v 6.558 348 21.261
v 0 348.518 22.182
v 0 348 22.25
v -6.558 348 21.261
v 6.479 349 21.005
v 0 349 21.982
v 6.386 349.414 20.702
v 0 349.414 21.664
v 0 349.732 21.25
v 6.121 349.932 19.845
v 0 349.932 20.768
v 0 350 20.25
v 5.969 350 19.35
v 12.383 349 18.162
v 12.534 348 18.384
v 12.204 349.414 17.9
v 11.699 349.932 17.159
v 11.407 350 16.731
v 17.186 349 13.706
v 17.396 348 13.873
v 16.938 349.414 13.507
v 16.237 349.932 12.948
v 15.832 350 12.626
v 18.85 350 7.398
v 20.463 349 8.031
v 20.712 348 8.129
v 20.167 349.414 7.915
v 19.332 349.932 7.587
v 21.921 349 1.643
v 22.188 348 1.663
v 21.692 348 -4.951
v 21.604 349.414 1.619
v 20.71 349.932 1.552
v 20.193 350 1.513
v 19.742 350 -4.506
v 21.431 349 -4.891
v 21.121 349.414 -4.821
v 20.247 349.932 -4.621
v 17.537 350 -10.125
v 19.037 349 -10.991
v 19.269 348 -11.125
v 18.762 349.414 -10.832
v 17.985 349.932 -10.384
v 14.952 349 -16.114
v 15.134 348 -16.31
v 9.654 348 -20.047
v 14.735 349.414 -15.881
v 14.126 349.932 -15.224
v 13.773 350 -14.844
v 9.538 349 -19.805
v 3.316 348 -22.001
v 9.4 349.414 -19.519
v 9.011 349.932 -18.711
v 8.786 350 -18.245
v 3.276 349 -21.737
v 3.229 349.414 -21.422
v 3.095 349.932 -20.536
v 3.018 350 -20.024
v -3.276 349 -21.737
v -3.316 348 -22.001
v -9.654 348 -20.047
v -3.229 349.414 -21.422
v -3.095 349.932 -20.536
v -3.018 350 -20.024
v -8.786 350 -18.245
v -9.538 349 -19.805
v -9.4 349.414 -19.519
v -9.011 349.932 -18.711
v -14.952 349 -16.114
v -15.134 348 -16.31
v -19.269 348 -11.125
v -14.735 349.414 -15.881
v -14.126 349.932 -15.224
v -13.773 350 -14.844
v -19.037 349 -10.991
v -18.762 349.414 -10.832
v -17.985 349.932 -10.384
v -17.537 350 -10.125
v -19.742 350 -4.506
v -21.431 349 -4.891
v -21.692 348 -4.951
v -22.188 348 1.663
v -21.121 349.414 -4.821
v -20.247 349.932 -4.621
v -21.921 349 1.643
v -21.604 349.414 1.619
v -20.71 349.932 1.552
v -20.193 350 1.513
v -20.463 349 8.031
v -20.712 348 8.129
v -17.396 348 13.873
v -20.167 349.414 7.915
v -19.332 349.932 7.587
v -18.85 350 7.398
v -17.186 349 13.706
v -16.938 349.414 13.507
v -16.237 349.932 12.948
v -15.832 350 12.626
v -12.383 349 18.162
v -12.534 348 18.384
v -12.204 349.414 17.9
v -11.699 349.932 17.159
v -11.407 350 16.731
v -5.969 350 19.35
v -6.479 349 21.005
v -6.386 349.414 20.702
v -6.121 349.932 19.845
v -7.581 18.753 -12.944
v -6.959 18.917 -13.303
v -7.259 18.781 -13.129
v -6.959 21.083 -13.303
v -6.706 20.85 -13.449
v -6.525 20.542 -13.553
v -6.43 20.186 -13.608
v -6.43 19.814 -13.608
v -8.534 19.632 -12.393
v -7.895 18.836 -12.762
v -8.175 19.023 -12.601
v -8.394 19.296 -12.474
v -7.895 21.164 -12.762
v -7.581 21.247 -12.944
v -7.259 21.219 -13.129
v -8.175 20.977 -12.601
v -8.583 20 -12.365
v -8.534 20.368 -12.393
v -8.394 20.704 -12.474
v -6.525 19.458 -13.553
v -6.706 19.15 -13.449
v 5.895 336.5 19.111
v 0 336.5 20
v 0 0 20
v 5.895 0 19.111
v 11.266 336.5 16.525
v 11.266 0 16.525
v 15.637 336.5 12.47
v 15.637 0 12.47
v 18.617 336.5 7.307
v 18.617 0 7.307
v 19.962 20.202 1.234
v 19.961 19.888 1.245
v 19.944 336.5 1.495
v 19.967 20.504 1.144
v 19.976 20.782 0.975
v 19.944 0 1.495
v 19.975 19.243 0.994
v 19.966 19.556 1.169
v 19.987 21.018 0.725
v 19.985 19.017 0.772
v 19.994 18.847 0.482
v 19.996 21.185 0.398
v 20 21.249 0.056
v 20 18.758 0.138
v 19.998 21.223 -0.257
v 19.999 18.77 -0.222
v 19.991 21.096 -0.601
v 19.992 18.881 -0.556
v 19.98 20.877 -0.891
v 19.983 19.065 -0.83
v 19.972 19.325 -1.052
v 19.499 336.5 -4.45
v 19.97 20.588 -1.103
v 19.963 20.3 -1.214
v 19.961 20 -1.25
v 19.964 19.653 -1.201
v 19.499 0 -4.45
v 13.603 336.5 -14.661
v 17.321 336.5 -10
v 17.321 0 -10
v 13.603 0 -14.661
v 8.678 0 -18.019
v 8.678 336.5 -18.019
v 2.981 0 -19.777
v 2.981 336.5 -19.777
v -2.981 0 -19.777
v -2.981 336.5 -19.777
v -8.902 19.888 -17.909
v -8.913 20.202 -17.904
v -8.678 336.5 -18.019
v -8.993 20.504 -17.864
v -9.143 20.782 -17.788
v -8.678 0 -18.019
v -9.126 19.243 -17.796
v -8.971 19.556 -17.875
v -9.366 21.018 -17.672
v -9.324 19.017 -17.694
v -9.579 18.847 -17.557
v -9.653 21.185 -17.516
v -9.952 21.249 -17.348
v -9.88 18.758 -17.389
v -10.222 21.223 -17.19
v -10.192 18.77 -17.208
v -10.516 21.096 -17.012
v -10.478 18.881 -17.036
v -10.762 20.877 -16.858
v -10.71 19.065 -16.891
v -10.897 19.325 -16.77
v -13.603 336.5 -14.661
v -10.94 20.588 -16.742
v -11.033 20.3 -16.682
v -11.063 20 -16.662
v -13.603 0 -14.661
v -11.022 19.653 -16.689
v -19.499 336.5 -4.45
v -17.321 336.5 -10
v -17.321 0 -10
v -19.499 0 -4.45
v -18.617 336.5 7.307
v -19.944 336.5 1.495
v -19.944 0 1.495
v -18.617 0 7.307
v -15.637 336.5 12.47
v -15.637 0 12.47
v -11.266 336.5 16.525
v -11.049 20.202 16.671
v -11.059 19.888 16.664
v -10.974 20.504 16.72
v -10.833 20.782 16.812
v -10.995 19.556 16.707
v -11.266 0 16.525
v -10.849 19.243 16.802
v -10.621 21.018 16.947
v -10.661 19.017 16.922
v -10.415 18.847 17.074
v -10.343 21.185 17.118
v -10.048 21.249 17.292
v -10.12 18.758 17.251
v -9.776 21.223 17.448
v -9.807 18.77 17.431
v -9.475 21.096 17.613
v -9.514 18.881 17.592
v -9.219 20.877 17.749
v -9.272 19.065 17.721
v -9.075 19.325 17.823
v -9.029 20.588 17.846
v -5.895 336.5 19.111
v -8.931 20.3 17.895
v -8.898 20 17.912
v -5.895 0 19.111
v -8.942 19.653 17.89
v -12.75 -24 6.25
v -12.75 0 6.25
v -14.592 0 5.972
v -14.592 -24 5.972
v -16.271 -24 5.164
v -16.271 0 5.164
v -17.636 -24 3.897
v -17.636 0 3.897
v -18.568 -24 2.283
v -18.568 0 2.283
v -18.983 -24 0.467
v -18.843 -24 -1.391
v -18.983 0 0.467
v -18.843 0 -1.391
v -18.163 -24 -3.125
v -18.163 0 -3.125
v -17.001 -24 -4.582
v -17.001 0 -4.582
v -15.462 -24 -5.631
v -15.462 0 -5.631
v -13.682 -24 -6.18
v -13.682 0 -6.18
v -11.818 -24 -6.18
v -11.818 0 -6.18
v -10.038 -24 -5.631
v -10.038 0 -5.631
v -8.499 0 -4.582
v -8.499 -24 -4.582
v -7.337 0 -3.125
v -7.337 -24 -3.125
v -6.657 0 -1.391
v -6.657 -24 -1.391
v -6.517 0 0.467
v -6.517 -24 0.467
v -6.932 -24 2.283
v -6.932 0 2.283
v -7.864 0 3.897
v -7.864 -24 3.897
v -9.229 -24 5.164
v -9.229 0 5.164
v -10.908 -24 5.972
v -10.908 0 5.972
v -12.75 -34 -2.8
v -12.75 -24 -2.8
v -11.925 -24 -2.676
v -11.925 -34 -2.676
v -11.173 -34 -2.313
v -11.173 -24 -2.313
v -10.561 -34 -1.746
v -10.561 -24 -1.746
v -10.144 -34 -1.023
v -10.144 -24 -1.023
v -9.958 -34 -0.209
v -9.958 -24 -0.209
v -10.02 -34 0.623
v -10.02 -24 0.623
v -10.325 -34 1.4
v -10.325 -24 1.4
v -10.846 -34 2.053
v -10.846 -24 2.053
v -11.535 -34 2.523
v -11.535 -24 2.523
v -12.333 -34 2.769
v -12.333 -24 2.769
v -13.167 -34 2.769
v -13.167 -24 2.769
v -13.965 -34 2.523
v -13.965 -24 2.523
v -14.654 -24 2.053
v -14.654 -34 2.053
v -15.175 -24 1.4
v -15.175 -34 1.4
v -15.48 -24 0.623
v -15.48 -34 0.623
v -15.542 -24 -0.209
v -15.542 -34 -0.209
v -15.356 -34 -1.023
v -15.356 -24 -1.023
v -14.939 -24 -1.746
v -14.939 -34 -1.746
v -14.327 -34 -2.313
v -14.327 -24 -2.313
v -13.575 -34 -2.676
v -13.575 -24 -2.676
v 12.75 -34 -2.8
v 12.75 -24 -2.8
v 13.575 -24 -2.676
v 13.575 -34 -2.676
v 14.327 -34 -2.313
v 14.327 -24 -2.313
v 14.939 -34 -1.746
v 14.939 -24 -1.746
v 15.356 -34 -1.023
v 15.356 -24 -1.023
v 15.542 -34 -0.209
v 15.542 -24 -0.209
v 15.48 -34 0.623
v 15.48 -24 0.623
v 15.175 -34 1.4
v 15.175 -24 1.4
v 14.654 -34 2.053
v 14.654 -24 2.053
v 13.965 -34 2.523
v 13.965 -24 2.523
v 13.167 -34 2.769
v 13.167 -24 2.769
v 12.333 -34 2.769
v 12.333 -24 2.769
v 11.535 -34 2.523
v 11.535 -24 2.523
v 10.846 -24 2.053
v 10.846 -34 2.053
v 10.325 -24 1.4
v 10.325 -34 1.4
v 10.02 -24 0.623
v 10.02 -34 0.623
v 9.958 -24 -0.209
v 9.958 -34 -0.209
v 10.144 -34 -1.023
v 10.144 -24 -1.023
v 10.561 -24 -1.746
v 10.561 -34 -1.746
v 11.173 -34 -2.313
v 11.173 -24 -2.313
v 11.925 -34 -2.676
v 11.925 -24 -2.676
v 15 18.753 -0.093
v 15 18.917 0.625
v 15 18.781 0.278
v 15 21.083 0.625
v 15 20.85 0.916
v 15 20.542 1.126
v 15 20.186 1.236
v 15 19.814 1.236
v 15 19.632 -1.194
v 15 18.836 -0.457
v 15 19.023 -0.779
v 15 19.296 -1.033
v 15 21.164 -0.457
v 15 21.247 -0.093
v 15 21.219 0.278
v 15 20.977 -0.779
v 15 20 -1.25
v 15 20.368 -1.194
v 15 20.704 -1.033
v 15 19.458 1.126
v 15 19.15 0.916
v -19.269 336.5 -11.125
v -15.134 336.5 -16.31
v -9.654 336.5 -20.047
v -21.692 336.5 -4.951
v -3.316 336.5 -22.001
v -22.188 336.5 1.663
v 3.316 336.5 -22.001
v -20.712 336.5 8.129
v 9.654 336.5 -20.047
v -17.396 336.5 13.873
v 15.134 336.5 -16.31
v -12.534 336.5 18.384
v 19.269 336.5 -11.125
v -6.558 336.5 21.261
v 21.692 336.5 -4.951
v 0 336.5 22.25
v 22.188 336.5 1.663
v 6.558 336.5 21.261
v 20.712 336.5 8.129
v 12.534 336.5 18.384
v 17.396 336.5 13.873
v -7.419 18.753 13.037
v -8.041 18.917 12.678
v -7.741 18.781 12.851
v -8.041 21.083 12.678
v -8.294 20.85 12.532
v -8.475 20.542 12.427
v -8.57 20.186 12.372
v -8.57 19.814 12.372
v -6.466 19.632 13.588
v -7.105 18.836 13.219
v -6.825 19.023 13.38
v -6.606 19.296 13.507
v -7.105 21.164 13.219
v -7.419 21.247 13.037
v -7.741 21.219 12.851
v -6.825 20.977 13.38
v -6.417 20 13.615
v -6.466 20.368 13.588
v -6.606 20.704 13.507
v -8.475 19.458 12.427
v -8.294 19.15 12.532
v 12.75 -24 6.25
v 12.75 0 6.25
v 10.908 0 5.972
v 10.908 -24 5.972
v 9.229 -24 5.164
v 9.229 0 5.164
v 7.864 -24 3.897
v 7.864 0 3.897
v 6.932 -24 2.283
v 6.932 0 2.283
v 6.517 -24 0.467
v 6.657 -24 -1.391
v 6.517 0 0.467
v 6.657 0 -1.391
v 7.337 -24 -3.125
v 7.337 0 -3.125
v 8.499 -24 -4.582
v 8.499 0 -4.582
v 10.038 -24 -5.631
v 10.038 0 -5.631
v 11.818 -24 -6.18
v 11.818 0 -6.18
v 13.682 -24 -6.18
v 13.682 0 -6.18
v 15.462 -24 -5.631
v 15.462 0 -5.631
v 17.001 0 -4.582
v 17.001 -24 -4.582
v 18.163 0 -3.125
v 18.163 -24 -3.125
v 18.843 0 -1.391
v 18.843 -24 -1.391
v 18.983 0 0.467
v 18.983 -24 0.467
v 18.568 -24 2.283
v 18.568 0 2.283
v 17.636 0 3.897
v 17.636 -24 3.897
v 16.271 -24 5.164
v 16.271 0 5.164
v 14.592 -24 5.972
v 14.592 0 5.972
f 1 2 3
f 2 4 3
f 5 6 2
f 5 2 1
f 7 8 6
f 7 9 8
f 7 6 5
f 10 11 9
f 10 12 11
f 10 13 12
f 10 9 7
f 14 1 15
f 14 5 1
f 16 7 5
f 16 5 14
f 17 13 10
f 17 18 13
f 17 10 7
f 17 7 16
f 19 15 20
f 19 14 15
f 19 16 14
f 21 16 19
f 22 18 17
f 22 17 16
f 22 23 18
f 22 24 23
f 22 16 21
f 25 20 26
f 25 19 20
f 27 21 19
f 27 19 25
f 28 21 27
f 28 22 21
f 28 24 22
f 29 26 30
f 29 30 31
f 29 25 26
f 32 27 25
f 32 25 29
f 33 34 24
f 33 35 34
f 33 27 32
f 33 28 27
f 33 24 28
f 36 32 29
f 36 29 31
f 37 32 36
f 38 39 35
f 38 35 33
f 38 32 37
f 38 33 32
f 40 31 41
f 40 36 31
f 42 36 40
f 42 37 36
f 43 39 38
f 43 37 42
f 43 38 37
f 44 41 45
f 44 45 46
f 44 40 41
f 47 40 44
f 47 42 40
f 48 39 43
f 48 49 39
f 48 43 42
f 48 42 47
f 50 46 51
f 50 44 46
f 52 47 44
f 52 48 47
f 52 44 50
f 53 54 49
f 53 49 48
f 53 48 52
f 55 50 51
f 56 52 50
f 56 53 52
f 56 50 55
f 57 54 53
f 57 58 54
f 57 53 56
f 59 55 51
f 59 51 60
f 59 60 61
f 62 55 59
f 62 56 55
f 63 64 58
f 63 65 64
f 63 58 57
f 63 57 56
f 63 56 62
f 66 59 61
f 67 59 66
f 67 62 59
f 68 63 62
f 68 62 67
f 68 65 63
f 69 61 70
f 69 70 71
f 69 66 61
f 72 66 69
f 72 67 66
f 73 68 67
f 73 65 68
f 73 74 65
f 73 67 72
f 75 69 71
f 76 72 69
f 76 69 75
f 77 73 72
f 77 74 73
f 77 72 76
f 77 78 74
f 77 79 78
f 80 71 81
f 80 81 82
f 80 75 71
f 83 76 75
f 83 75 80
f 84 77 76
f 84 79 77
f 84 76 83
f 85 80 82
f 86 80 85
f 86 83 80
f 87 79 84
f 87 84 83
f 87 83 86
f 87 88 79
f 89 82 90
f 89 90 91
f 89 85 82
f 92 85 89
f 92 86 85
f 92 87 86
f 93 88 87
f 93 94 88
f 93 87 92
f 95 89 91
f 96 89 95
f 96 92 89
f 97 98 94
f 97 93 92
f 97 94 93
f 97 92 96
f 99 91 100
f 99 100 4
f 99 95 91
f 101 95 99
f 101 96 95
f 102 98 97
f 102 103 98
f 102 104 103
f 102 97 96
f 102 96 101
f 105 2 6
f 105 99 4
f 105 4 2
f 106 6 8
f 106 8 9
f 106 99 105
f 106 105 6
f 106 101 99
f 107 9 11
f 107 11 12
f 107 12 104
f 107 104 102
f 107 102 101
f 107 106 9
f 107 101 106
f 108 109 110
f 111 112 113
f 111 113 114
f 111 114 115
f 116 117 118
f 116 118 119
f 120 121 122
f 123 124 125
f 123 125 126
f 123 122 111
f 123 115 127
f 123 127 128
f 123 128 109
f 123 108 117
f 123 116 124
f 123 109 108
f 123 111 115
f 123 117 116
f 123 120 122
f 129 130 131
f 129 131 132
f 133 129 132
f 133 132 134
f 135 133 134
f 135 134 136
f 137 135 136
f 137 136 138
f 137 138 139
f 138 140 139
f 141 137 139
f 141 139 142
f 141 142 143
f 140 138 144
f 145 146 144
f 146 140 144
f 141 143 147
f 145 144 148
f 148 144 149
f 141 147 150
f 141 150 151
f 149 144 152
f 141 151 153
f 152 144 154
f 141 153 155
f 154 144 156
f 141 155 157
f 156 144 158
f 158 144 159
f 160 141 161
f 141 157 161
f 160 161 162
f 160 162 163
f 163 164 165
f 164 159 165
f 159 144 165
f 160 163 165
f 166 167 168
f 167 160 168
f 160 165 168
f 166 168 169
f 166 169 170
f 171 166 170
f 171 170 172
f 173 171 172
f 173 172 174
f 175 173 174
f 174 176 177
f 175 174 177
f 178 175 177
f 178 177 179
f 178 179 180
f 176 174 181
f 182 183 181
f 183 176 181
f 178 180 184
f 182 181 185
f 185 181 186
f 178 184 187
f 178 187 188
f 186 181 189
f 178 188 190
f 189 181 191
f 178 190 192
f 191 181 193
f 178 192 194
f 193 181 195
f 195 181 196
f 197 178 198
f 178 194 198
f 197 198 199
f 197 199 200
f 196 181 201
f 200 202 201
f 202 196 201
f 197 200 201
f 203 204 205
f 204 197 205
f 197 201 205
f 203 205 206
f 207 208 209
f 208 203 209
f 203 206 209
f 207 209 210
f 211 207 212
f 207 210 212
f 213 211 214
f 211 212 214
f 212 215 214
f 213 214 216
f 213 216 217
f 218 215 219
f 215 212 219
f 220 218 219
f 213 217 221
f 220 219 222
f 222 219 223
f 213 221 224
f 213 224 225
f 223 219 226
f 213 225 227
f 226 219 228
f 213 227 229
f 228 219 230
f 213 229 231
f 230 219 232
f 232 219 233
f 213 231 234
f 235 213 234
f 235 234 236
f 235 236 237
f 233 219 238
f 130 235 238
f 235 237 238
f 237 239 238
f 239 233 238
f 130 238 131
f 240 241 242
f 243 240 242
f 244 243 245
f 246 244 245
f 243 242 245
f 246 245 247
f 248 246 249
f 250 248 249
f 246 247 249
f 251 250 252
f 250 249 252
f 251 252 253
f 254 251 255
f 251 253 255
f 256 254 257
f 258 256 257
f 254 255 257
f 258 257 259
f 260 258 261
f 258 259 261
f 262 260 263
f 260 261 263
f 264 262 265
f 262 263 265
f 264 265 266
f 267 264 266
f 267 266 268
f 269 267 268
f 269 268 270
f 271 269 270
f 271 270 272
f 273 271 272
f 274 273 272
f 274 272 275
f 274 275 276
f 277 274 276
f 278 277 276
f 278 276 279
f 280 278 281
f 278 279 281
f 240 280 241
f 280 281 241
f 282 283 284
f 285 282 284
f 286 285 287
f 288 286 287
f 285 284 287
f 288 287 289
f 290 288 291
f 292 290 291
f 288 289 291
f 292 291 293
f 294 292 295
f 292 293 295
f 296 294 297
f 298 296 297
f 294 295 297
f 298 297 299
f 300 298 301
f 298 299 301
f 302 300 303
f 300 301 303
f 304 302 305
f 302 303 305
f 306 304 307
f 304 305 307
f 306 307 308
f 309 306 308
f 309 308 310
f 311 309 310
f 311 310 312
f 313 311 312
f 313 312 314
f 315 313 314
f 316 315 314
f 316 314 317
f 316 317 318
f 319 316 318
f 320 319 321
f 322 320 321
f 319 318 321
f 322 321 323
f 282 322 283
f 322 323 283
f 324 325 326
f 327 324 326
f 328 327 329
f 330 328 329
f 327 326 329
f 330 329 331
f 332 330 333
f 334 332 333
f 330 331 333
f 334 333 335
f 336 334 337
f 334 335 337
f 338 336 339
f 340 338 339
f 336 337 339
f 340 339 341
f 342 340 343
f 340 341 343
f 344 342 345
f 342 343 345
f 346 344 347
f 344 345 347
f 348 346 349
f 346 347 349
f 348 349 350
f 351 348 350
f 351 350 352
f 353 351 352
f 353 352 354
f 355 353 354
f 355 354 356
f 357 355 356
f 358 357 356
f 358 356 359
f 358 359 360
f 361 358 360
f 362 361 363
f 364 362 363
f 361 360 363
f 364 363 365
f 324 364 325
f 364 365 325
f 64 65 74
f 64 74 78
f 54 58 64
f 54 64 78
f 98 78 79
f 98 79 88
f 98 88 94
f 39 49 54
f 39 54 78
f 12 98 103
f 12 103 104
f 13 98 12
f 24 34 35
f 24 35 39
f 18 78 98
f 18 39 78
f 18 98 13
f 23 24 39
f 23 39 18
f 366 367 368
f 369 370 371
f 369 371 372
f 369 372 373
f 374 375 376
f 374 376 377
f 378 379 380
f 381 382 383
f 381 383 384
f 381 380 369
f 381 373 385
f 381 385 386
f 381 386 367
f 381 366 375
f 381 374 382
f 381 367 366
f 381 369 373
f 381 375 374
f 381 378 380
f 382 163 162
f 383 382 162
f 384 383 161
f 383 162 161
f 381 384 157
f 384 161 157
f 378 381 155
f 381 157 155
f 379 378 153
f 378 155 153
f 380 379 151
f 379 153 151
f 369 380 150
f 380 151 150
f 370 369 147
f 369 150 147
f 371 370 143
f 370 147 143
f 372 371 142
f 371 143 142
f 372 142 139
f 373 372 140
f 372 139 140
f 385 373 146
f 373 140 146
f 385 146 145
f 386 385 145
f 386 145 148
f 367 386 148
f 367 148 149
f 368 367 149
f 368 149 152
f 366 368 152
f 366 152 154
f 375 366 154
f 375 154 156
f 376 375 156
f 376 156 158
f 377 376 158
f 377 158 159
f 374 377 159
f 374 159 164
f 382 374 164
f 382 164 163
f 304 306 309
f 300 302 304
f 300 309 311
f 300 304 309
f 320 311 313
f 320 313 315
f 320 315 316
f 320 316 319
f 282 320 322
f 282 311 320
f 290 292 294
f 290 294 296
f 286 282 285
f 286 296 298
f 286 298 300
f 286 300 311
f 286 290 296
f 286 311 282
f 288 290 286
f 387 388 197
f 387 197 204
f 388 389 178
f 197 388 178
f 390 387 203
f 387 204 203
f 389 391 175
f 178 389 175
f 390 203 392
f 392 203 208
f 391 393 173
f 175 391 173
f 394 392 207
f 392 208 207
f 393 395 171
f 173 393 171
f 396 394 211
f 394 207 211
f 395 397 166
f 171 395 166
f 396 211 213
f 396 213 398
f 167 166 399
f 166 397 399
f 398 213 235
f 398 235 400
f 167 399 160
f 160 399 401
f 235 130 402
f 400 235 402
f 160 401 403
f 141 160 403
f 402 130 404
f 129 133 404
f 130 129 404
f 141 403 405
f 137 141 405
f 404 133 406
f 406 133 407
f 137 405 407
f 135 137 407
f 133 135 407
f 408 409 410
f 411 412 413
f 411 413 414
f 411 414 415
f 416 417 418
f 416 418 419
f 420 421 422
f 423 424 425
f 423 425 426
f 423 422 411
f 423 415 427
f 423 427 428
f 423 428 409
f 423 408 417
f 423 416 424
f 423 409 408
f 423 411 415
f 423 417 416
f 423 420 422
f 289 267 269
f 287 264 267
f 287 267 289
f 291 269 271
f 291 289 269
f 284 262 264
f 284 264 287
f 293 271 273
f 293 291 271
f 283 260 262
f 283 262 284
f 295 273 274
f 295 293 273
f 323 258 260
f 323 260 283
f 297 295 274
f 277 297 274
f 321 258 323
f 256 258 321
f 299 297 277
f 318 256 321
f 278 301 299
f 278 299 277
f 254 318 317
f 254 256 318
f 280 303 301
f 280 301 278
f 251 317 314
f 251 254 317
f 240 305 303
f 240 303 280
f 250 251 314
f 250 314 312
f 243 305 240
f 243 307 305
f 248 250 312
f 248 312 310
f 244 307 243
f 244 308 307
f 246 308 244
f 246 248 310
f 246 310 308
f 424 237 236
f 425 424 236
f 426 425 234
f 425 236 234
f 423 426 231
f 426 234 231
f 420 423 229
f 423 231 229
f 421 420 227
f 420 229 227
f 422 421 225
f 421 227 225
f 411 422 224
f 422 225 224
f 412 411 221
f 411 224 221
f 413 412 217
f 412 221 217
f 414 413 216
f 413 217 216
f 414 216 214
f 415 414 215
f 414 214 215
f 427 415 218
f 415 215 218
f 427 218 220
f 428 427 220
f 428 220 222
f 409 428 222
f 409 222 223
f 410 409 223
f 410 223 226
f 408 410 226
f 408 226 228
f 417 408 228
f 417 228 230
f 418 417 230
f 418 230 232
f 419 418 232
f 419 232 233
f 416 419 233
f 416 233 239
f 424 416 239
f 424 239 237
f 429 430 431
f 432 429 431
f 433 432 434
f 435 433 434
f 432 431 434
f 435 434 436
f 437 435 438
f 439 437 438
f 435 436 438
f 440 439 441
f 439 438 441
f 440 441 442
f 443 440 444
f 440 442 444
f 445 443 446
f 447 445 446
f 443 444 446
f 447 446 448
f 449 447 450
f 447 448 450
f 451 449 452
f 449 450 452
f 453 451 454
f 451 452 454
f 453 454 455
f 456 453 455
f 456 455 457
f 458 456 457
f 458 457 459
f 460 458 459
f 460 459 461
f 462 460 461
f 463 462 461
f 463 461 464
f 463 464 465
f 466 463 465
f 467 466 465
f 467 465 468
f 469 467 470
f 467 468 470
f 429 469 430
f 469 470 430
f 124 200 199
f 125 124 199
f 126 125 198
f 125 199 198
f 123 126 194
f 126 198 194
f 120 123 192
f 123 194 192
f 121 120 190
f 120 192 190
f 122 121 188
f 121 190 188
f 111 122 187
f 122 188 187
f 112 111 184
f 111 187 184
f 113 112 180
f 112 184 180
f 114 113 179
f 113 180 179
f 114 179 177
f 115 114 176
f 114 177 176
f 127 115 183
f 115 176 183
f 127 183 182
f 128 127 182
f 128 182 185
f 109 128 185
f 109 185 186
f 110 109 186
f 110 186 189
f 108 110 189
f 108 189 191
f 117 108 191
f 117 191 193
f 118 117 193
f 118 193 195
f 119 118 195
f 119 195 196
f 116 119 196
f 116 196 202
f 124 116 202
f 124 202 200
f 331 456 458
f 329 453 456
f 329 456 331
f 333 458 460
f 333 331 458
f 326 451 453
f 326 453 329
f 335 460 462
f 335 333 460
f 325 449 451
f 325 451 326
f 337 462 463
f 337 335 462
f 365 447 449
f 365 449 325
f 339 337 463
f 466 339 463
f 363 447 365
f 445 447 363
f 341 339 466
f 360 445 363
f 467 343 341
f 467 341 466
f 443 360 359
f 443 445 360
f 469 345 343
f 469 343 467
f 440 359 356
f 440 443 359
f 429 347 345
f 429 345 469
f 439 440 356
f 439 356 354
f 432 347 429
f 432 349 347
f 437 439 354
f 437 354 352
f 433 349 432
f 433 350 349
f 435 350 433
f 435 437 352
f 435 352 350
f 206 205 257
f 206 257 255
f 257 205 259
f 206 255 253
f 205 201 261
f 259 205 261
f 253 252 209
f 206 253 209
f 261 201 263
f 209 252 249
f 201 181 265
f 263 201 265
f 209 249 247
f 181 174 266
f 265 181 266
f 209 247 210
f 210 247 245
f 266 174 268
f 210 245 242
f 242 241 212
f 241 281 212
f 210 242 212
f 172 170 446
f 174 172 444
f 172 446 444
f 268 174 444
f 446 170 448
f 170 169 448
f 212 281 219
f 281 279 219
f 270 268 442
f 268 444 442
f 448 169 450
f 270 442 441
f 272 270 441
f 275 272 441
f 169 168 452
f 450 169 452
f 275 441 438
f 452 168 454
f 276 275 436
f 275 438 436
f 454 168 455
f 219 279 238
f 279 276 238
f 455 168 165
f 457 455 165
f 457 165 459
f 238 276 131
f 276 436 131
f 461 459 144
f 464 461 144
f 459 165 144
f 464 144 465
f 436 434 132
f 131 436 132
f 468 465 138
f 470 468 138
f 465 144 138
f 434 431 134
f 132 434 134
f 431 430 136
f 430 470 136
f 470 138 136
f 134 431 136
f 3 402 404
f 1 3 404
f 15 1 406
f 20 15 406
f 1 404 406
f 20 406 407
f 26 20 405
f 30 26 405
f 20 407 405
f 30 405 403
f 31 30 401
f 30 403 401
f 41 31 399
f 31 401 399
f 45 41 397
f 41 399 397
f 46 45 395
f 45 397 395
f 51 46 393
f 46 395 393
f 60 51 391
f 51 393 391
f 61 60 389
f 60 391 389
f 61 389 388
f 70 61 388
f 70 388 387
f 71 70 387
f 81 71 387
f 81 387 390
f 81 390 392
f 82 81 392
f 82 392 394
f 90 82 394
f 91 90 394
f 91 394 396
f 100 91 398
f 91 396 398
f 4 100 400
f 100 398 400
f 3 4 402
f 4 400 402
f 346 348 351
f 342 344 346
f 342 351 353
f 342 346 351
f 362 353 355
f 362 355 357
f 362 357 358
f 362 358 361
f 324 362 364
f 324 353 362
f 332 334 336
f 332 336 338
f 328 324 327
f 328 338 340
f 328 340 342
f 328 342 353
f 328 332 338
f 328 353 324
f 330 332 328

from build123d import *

# Parameters (mm, degrees)
SKETCH1_R                = 20
BOSS_EXTRUDE1_DEPTH      = 345
BOSS_EXTRUDE2_DEPTH      = 5
BOSS_EXTRUDE2_DEPTH_BACK = 8.5
SKETCH2_R                = 22.25
FILLET1_R                = 2
SKETCH3_R                = 1.25
CUT_EXTRUDE1_DEPTH       = 5
CIRPATTERN1_COUNT        = 3
SKETCH4_R                = 6.25
BOSS_EXTRUDE3_DEPTH      = 24
SKETCH5_R                = 2.8
BOSS_EXTRUDE4_DEPTH      = 10


with BuildPart() as part:
    # Sketch1 → Boss-Extrude1 (new body)
    with BuildSketch(Plane(origin=(0, 0, 0), x_dir=(1, 0, 0), z_dir=(0, 1, 0))):
        with Locations(Location((0, 0, 0), (0, 0, 270))):
            Circle(SKETCH1_R)
    extrude(amount=BOSS_EXTRUDE1_DEPTH)

    # Sketch2 → Boss-Extrude2 (add, two sides: drawn at the far end of the back side and taken through both)
    with BuildSketch(Plane(origin=(0, 345, 0), x_dir=(1, 0, 0), z_dir=(0, 1, 0)).offset(-BOSS_EXTRUDE2_DEPTH_BACK)):
        with Locations(Location((0, 0, 0), (0, 0, 270))):
            Circle(SKETCH2_R)
    extrude(amount=BOSS_EXTRUDE2_DEPTH + BOSS_EXTRUDE2_DEPTH_BACK)

    # Fillet1
    fillet1_edges = [part.edges().sort_by_distance(p)[0] for p in [
        (0, 350, -22.25),
    ]]
    fillet(fillet1_edges, radius=FILLET1_R)

    # Sketch3 → Cut-Extrude1 (cut)
    with BuildSketch(Plane(origin=(20, 0, 0), x_dir=(0, 0, -1), z_dir=(1, 0, 0))):
        with Locations((0, 20)):
            Circle(SKETCH3_R)
    cut_extrude1 = extrude(amount=-CUT_EXTRUDE1_DEPTH, mode=Mode.SUBTRACT)

    # CirPattern1: Cut-Extrude1 ×3 about axis
    cirpattern1_axis = Axis((0, 0, 0), (0, 1, 0))
    for i in range(1, CIRPATTERN1_COUNT):
        add(cut_extrude1.rotate(cirpattern1_axis, i * 360 / CIRPATTERN1_COUNT), mode=Mode.SUBTRACT)

    # Sketch4 → Boss-Extrude3 (add)
    with BuildSketch(Plane.XZ):
        with Locations(Location((-12.75, 0, 0), (0, 0, 90))):
            Circle(SKETCH4_R)
        with Locations(Location((12.75, 0, 0), (0, 0, 90))):
            Circle(SKETCH4_R)
    extrude(amount=BOSS_EXTRUDE3_DEPTH)

    # Sketch5 → Boss-Extrude4 (add)
    with BuildSketch(Plane.XZ.offset(24)):
        with Locations(Location((-12.75, 0, 0), (0, 0, 270))):
            Circle(SKETCH5_R)
        with Locations(Location((12.75, 0, 0), (0, 0, 270))):
            Circle(SKETCH5_R)
    extrude(amount=BOSS_EXTRUDE4_DEPTH)


solid = part.part
